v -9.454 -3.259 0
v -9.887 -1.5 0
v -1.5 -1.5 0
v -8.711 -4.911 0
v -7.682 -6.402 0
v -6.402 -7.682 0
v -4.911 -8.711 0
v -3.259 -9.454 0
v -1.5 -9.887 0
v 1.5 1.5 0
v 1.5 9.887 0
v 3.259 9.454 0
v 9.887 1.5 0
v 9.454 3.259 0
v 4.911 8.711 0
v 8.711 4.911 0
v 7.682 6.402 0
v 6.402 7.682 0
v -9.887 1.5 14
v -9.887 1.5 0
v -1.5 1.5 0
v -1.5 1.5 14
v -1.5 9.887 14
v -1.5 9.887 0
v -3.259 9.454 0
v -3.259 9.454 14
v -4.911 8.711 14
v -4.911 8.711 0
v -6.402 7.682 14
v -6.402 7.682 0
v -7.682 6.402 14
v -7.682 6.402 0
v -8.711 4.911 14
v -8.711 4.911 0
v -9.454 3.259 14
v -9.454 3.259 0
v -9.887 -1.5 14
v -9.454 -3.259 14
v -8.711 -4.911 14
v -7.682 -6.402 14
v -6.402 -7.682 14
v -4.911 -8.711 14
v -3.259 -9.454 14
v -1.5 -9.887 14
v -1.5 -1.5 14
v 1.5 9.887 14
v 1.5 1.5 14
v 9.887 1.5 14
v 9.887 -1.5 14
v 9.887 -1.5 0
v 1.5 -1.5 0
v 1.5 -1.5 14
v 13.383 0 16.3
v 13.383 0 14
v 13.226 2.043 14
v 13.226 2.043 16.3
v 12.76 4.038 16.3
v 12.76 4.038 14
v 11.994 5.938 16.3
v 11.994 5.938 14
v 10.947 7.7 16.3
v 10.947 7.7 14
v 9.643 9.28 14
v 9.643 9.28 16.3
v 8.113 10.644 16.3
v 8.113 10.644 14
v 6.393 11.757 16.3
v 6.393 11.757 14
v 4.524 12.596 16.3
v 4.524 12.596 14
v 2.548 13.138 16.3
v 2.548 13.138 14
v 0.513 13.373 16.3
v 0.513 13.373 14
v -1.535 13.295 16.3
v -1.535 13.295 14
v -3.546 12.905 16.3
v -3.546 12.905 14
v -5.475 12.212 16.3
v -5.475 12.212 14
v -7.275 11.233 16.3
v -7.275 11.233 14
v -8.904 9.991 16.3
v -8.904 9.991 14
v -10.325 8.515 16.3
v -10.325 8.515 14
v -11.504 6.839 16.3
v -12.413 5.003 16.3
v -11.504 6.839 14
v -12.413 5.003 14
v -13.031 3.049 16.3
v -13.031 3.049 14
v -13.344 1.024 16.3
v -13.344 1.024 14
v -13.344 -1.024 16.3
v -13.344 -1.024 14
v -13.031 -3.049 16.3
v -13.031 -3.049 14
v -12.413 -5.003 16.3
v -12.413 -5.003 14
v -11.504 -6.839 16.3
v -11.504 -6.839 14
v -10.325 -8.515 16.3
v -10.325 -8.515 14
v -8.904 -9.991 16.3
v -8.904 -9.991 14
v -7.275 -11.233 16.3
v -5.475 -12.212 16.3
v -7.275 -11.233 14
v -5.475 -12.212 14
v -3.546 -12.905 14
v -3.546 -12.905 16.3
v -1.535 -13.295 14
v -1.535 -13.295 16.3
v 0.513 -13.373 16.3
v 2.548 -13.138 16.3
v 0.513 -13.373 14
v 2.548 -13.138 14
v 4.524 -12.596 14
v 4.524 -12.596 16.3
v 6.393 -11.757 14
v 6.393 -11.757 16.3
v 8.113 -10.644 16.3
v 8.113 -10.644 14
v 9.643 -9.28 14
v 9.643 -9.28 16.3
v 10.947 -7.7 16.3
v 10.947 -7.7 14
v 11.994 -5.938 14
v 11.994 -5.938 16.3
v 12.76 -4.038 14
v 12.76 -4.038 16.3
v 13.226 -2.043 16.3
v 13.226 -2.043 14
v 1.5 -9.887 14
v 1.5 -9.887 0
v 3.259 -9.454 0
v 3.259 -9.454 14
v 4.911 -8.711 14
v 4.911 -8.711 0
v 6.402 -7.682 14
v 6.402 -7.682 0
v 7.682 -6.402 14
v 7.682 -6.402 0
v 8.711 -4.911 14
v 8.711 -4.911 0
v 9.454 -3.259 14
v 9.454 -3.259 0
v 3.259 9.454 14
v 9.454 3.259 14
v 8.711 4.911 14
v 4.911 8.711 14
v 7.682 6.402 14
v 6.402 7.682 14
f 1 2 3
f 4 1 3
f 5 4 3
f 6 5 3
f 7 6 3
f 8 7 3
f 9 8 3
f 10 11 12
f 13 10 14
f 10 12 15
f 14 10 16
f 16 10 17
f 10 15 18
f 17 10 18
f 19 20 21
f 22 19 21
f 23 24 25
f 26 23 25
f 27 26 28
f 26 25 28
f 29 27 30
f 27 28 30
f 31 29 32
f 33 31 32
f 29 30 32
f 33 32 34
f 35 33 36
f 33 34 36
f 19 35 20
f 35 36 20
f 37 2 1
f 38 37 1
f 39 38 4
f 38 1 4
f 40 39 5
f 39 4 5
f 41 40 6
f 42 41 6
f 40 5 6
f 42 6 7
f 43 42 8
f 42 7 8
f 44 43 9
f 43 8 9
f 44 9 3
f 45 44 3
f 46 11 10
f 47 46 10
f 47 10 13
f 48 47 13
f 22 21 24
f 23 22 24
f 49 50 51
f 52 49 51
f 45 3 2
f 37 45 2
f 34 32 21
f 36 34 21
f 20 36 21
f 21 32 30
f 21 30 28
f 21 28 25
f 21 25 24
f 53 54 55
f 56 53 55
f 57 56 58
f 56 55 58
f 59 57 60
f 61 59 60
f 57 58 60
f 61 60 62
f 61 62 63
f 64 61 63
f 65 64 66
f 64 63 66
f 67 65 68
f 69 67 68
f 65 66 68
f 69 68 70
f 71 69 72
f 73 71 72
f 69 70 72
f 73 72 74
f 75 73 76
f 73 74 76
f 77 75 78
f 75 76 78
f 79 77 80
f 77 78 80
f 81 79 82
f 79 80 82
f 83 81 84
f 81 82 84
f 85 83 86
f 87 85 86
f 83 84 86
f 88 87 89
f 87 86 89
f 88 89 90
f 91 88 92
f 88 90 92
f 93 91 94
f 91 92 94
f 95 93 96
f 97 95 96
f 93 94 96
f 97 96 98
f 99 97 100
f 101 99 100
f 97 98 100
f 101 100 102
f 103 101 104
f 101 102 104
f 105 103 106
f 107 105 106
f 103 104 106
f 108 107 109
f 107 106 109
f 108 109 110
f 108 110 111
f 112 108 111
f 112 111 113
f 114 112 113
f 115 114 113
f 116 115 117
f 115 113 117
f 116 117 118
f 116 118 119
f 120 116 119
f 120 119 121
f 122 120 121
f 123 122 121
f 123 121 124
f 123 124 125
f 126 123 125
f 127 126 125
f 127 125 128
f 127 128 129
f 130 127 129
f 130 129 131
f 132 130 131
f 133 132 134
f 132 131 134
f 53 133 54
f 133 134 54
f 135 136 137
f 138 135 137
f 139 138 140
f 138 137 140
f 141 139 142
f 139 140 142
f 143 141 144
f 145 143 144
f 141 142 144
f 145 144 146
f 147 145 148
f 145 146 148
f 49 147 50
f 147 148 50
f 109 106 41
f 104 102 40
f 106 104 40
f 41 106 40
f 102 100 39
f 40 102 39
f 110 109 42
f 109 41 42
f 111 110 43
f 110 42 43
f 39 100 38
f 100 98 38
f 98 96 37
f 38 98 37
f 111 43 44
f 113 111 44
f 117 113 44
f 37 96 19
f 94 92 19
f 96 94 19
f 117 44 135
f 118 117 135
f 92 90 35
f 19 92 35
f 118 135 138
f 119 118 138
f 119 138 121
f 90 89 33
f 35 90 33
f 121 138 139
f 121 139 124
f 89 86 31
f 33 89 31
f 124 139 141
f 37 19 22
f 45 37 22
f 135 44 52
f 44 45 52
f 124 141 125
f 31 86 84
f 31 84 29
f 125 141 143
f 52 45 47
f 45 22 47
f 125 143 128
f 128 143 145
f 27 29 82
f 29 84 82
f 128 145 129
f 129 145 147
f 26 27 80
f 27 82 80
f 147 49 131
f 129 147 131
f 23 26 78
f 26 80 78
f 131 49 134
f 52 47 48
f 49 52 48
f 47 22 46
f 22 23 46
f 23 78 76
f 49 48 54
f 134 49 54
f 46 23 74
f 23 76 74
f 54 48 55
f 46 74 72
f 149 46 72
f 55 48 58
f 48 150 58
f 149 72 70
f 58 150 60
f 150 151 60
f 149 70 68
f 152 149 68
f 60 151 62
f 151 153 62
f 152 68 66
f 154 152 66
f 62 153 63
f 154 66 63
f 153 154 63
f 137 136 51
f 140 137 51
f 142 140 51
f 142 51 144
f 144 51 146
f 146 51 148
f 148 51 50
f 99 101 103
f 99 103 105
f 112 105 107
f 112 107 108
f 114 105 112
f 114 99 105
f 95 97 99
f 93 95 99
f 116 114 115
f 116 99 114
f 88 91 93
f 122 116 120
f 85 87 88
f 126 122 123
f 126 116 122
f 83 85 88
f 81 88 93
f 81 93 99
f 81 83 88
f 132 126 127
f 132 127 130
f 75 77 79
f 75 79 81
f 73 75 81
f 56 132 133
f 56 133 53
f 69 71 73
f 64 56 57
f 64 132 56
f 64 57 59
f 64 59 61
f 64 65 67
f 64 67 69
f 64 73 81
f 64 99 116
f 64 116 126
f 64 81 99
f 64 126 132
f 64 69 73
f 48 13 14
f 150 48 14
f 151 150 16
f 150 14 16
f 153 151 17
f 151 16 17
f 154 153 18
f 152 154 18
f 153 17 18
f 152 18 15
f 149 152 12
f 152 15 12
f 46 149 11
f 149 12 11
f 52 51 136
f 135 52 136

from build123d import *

# Parameters (mm, degrees)
F1_DEPTH = 14
F2_R     = 13.3833019173
F3_DEPTH = 2.3


with BuildPart() as f1:
    # F0 (on Top) → F1 (new body)
    with BuildSketch(Plane.XY):
        with BuildLine():
            Line((1.5, 1.5), (9.8868599666, 1.5))
            ThreePointArc((9.8868599666, 1.5), (7.0710678119, 7.0710678119), (1.5, 9.8868599666))
            Line((1.5, 9.8868599666), (1.5, 1.5))
        make_face()
    extrude(amount=F1_DEPTH)



with BuildPart() as f1b:
    # F0 (on Top) → F1, piece 2 (new body)
    with BuildSketch(Plane.XY):
        with BuildLine():
            ThreePointArc((1.5, -9.8868599666), (7.0710678119, -7.0710678119), (9.8868599666, -1.5))
            Line((9.8868599666, -1.5), (1.5, -1.5))
            Line((1.5, -1.5), (1.5, -9.8868599666))
        make_face()
    extrude(amount=F1_DEPTH)


with BuildPart() as f1c:
    # F0 (on Top) → F1, piece 3 (new body)
    with BuildSketch(Plane.XY):
        with BuildLine():
            Line((-1.5, 1.5), (-1.5, 9.8868599666))
            ThreePointArc((-1.5, 9.8868599666), (-7.0710678119, 7.0710678119), (-9.8868599666, 1.5))
            Line((-9.8868599666, 1.5), (-1.5, 1.5))
        make_face()
    extrude(amount=F1_DEPTH)


with BuildPart() as f1d:
    # F0 (on Top) → F1, piece 4 (new body)
    with BuildSketch(Plane.XY):
        with BuildLine():
            ThreePointArc((-9.8868599666, -1.5), (-7.0710678119, -7.0710678119), (-1.5, -9.8868599666))
            Line((-1.5, -9.8868599666), (-1.5, -1.5))
            Line((-1.5, -1.5), (-9.8868599666, -1.5))
        make_face()
    extrude(amount=F1_DEPTH)


with BuildPart() as f1_1:
    add(f1.part)

    add(f1b.part)  # F3 merges F1b

    add(f1c.part)  # F3 merges F1c

    add(f1d.part)  # F3 merges F1d
    # F2 (on face) → F3 (join)
    with BuildSketch(Plane.XY.offset(14)):
        Circle(F2_R)
        with BuildLine():
            Line((-1.5, 1.5), (-9.8868599666, 1.5))
            ThreePointArc((-9.8868599666, 1.5), (-7.0710678119, 7.0710678119), (-1.5, 9.8868599666))
            Line((-1.5, 9.8868599666), (-1.5, 1.5))
        make_face(mode=Mode.SUBTRACT)
        with BuildLine():
            ThreePointArc((-1.5, 9.8868599666), (-7.0710678119, 7.0710678119), (-9.8868599666, 1.5))
            Line((-9.8868599666, 1.5), (-1.5, 1.5))
            Line((-1.5, 1.5), (-1.5, 9.8868599666))
        make_face()
    extrude(amount=F3_DEPTH)


solid = f1_1.part
